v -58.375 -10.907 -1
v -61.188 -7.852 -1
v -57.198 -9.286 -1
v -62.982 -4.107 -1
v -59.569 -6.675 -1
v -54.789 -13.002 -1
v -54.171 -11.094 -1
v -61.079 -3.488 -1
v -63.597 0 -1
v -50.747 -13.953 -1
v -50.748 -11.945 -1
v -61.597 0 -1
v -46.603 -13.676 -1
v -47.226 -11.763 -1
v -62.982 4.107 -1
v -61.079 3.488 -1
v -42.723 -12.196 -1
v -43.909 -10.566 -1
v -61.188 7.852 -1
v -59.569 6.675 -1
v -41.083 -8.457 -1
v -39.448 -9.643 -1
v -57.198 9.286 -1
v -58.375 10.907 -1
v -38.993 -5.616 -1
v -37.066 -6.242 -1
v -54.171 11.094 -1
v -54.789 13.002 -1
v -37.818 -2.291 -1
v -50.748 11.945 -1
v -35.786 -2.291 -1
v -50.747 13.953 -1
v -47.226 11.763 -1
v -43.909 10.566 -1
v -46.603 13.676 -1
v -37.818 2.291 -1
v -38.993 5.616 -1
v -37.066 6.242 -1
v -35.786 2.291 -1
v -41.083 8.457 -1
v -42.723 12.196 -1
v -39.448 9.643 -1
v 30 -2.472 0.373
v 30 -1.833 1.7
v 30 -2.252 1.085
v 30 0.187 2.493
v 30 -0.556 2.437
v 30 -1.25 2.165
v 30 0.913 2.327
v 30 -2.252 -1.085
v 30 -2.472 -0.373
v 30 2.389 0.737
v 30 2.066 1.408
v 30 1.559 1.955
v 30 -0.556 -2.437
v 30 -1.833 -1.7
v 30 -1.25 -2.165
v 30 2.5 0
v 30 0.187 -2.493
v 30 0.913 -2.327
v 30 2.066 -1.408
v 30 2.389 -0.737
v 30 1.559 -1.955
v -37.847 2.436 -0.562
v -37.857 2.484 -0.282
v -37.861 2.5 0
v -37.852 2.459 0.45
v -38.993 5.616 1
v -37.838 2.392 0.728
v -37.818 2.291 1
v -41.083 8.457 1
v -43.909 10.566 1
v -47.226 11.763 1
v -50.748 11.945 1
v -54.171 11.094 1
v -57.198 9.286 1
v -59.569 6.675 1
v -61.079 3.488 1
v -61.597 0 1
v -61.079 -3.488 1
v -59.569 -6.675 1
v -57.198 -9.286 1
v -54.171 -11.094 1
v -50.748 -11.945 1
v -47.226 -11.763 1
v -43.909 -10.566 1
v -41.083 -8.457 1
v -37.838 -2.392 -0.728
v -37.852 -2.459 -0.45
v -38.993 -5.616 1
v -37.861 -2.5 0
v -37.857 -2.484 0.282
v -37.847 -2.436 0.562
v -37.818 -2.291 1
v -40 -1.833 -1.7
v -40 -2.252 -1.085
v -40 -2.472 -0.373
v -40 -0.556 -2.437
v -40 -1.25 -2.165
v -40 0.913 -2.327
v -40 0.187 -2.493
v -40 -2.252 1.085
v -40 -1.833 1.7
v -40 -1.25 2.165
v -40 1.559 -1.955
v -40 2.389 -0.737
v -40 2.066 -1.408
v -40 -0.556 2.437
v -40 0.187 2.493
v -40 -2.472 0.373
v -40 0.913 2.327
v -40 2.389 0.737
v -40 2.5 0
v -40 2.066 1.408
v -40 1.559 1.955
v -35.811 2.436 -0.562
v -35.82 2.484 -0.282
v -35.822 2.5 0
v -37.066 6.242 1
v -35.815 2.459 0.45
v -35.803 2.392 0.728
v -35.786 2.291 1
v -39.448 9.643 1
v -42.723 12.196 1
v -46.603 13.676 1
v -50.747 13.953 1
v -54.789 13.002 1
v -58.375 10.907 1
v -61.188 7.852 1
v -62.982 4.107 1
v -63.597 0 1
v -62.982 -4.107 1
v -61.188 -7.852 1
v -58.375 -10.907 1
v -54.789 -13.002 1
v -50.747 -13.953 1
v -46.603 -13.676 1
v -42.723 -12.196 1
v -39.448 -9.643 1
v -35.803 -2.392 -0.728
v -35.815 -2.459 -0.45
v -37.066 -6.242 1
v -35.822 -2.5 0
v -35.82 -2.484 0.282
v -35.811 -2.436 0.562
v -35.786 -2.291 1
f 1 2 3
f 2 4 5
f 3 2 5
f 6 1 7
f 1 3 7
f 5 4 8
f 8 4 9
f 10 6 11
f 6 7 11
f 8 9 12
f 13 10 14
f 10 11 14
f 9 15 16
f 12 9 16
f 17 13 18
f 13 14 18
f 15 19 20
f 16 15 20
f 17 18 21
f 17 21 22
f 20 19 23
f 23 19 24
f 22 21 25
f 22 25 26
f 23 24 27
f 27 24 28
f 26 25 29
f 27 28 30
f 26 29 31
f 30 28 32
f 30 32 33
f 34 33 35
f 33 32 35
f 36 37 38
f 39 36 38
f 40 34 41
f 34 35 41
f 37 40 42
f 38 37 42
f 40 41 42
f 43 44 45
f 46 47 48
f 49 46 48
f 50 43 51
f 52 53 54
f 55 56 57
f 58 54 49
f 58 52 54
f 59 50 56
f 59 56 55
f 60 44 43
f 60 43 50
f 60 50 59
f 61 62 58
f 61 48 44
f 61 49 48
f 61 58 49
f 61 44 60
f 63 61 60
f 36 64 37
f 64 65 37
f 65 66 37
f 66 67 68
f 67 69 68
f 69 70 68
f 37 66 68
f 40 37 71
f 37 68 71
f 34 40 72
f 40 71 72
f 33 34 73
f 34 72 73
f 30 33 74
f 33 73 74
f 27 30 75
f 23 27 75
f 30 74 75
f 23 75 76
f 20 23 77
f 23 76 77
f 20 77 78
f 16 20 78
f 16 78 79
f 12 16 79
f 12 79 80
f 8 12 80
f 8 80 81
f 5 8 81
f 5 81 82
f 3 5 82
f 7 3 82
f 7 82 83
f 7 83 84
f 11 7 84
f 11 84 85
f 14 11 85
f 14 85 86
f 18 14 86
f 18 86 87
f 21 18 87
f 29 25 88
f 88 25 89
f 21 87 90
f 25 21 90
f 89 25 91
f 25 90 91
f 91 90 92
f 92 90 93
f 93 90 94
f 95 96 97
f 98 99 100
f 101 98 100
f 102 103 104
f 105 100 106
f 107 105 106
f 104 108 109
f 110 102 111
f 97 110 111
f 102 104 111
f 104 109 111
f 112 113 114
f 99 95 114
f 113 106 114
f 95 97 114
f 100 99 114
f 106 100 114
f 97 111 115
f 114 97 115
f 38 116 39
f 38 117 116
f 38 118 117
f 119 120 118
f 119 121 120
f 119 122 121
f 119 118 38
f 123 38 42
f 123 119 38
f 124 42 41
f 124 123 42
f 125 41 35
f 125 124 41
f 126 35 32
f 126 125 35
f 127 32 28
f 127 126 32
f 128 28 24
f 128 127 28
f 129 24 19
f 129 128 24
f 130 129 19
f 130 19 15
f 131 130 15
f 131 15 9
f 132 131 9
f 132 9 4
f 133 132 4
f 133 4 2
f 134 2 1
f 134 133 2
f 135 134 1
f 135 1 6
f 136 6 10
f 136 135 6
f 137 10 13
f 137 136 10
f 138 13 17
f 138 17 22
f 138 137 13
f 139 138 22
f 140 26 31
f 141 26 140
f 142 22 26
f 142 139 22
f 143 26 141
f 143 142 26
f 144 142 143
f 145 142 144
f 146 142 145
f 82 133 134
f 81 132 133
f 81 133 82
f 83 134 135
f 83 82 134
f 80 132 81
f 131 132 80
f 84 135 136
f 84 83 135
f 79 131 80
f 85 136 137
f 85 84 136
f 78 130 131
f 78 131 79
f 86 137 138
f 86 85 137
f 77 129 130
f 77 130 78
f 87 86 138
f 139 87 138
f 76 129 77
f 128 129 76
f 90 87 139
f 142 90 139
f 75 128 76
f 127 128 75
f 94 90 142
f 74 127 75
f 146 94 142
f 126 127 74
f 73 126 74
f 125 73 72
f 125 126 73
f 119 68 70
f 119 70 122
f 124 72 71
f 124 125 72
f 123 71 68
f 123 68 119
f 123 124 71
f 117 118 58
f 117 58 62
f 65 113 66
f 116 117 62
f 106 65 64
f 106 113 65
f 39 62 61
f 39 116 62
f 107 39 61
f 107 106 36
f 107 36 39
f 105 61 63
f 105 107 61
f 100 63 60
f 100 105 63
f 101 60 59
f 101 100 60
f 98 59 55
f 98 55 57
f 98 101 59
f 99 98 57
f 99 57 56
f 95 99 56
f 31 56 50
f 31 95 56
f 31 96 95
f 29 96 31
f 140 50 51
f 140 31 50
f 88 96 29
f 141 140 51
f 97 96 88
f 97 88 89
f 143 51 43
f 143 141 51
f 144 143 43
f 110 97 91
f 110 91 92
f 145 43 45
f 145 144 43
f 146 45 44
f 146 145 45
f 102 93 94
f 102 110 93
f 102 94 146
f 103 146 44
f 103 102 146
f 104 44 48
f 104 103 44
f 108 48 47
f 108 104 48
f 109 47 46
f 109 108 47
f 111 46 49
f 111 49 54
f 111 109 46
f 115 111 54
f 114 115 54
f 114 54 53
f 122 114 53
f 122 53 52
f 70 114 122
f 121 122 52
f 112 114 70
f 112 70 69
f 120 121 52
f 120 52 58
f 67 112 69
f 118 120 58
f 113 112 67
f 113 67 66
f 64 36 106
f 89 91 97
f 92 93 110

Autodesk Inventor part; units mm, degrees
ref_plane "YZ Plane" through (0, 0, 0) normal (1, 0, 0) x (0, 1, 0)
ref_plane "XZ Plane" through (0, 0, 0) normal (0, 1, 0) x (-1, 0, 0)
ref_plane "XY Plane" through (0, 0, 0) normal (0, 0, 1) x (1, 0, 0)
sketch "Sketch1" plane through (0, 0, 0) normal (1, 0, 0) x (0, 1, 0)
  circle A0 centre (0, 0) radius 2.5
  dimension "d0" = 5
extrude "Extrusion1" add sketch "Sketch1" along normal mid plane 80
sketch "Sketch3" plane through (0, 0, 0) normal (0, 0, 1) x (1, 0, 0)
  circle A0 centre (-49.5974, 0) radius 12
  circle A1 centre (-49.5974, 0) radius 14
  point P0 (0, 0)
  dimension "d6" = 24
  dimension "d7" = 28
extrude "Extrusion3" add sketch "Sketch3" along normal mid plane 2
sketch "Sketch4" plane through (40, 0, 0) normal (1, 0, 0) x (0, 0, -1)
  circle A0 centre (0, 0) radius 2.5 projected
extrude "Extrusion4" cut sketch "Sketch4" against normal blind 10
properties part number "SS-5FL111-3T_Housing_02"
